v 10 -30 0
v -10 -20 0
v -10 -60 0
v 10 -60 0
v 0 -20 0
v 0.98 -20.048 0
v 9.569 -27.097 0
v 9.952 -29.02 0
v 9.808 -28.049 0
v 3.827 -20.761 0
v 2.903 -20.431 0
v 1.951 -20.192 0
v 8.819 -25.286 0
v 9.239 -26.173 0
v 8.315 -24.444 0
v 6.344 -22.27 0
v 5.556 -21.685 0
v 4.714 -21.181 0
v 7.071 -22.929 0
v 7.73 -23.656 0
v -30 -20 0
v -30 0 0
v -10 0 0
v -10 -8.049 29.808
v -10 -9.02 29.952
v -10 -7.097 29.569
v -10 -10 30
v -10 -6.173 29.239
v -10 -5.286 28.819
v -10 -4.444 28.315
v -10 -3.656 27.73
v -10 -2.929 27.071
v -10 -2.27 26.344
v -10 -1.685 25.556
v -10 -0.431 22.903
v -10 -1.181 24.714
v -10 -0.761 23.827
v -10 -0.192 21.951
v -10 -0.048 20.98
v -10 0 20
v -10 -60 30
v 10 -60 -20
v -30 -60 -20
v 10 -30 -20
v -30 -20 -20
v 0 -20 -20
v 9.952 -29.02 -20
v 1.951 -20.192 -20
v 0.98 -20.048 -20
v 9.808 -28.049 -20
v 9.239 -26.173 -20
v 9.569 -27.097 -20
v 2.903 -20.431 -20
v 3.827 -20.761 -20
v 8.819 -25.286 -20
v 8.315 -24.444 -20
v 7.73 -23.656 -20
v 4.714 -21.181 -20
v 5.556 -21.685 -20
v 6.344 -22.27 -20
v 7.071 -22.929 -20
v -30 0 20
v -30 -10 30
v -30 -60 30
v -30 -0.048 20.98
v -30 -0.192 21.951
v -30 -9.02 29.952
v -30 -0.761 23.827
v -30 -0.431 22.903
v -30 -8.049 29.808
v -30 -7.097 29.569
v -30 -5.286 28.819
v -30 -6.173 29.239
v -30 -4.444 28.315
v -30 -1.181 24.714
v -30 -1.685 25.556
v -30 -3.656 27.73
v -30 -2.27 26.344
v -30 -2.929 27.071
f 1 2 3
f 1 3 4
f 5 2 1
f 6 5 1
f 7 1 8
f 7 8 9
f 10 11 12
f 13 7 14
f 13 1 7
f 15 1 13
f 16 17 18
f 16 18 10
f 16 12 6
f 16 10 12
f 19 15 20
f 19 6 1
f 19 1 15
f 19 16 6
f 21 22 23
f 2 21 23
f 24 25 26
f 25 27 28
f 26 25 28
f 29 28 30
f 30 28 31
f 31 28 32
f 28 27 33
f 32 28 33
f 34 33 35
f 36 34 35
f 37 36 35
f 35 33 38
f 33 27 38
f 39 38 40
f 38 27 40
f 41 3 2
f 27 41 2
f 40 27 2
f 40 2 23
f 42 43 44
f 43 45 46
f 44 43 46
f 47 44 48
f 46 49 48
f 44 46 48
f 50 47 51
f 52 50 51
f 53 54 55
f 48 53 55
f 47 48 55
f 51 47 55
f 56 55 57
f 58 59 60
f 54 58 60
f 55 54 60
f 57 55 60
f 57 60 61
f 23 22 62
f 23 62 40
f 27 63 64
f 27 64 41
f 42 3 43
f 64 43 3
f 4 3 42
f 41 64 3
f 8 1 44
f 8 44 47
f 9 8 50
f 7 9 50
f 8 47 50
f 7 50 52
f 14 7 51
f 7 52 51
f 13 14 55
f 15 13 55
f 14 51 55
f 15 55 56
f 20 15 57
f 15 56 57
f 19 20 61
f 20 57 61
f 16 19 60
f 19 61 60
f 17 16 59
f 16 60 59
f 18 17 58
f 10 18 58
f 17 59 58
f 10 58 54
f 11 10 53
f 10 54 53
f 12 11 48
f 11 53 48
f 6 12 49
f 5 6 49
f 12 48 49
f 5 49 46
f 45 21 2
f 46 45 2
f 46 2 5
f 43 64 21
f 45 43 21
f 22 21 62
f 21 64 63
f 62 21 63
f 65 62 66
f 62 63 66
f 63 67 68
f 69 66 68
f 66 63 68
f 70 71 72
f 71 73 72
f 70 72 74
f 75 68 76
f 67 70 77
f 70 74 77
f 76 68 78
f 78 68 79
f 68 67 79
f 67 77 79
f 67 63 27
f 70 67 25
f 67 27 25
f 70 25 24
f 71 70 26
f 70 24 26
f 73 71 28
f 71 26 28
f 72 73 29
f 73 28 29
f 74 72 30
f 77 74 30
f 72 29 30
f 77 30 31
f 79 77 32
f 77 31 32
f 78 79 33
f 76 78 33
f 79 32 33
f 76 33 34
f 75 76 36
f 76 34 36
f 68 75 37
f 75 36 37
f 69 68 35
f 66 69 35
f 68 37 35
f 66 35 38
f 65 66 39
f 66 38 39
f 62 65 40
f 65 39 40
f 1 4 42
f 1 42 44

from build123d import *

# Parameters (mm, degrees)
SKETCH1_W           = 20
SKETCH1_H           = 60
BOSS_EXTRUDE1_DEPTH = 30
SKETCH2_W           = 40
SKETCH2_H           = 40
BOSS_EXTRUDE2_DEPTH = 20
FILLET1_R           = 10


with BuildPart() as part:
    # Sketch1 → Boss-Extrude1 (new body)
    with BuildSketch(Plane.XY):
        with Locations((-20, -30)):
            Rectangle(SKETCH1_W, SKETCH1_H)
    extrude(amount=BOSS_EXTRUDE1_DEPTH)

    # Sketch2 → Boss-Extrude2 (add)
    with BuildSketch(Plane.XY):
        with Locations((-10, -40)):
            Rectangle(SKETCH2_W, SKETCH2_H)
    extrude(amount=-BOSS_EXTRUDE2_DEPTH)

    # Fillet1
    fillet1_edges = [part.edges().sort_by_distance(p)[0] for p in [
        (10, -20, -10),
        (-20, 0, 30),
    ]]
    fillet(fillet1_edges, radius=FILLET1_R)


solid = part.part
